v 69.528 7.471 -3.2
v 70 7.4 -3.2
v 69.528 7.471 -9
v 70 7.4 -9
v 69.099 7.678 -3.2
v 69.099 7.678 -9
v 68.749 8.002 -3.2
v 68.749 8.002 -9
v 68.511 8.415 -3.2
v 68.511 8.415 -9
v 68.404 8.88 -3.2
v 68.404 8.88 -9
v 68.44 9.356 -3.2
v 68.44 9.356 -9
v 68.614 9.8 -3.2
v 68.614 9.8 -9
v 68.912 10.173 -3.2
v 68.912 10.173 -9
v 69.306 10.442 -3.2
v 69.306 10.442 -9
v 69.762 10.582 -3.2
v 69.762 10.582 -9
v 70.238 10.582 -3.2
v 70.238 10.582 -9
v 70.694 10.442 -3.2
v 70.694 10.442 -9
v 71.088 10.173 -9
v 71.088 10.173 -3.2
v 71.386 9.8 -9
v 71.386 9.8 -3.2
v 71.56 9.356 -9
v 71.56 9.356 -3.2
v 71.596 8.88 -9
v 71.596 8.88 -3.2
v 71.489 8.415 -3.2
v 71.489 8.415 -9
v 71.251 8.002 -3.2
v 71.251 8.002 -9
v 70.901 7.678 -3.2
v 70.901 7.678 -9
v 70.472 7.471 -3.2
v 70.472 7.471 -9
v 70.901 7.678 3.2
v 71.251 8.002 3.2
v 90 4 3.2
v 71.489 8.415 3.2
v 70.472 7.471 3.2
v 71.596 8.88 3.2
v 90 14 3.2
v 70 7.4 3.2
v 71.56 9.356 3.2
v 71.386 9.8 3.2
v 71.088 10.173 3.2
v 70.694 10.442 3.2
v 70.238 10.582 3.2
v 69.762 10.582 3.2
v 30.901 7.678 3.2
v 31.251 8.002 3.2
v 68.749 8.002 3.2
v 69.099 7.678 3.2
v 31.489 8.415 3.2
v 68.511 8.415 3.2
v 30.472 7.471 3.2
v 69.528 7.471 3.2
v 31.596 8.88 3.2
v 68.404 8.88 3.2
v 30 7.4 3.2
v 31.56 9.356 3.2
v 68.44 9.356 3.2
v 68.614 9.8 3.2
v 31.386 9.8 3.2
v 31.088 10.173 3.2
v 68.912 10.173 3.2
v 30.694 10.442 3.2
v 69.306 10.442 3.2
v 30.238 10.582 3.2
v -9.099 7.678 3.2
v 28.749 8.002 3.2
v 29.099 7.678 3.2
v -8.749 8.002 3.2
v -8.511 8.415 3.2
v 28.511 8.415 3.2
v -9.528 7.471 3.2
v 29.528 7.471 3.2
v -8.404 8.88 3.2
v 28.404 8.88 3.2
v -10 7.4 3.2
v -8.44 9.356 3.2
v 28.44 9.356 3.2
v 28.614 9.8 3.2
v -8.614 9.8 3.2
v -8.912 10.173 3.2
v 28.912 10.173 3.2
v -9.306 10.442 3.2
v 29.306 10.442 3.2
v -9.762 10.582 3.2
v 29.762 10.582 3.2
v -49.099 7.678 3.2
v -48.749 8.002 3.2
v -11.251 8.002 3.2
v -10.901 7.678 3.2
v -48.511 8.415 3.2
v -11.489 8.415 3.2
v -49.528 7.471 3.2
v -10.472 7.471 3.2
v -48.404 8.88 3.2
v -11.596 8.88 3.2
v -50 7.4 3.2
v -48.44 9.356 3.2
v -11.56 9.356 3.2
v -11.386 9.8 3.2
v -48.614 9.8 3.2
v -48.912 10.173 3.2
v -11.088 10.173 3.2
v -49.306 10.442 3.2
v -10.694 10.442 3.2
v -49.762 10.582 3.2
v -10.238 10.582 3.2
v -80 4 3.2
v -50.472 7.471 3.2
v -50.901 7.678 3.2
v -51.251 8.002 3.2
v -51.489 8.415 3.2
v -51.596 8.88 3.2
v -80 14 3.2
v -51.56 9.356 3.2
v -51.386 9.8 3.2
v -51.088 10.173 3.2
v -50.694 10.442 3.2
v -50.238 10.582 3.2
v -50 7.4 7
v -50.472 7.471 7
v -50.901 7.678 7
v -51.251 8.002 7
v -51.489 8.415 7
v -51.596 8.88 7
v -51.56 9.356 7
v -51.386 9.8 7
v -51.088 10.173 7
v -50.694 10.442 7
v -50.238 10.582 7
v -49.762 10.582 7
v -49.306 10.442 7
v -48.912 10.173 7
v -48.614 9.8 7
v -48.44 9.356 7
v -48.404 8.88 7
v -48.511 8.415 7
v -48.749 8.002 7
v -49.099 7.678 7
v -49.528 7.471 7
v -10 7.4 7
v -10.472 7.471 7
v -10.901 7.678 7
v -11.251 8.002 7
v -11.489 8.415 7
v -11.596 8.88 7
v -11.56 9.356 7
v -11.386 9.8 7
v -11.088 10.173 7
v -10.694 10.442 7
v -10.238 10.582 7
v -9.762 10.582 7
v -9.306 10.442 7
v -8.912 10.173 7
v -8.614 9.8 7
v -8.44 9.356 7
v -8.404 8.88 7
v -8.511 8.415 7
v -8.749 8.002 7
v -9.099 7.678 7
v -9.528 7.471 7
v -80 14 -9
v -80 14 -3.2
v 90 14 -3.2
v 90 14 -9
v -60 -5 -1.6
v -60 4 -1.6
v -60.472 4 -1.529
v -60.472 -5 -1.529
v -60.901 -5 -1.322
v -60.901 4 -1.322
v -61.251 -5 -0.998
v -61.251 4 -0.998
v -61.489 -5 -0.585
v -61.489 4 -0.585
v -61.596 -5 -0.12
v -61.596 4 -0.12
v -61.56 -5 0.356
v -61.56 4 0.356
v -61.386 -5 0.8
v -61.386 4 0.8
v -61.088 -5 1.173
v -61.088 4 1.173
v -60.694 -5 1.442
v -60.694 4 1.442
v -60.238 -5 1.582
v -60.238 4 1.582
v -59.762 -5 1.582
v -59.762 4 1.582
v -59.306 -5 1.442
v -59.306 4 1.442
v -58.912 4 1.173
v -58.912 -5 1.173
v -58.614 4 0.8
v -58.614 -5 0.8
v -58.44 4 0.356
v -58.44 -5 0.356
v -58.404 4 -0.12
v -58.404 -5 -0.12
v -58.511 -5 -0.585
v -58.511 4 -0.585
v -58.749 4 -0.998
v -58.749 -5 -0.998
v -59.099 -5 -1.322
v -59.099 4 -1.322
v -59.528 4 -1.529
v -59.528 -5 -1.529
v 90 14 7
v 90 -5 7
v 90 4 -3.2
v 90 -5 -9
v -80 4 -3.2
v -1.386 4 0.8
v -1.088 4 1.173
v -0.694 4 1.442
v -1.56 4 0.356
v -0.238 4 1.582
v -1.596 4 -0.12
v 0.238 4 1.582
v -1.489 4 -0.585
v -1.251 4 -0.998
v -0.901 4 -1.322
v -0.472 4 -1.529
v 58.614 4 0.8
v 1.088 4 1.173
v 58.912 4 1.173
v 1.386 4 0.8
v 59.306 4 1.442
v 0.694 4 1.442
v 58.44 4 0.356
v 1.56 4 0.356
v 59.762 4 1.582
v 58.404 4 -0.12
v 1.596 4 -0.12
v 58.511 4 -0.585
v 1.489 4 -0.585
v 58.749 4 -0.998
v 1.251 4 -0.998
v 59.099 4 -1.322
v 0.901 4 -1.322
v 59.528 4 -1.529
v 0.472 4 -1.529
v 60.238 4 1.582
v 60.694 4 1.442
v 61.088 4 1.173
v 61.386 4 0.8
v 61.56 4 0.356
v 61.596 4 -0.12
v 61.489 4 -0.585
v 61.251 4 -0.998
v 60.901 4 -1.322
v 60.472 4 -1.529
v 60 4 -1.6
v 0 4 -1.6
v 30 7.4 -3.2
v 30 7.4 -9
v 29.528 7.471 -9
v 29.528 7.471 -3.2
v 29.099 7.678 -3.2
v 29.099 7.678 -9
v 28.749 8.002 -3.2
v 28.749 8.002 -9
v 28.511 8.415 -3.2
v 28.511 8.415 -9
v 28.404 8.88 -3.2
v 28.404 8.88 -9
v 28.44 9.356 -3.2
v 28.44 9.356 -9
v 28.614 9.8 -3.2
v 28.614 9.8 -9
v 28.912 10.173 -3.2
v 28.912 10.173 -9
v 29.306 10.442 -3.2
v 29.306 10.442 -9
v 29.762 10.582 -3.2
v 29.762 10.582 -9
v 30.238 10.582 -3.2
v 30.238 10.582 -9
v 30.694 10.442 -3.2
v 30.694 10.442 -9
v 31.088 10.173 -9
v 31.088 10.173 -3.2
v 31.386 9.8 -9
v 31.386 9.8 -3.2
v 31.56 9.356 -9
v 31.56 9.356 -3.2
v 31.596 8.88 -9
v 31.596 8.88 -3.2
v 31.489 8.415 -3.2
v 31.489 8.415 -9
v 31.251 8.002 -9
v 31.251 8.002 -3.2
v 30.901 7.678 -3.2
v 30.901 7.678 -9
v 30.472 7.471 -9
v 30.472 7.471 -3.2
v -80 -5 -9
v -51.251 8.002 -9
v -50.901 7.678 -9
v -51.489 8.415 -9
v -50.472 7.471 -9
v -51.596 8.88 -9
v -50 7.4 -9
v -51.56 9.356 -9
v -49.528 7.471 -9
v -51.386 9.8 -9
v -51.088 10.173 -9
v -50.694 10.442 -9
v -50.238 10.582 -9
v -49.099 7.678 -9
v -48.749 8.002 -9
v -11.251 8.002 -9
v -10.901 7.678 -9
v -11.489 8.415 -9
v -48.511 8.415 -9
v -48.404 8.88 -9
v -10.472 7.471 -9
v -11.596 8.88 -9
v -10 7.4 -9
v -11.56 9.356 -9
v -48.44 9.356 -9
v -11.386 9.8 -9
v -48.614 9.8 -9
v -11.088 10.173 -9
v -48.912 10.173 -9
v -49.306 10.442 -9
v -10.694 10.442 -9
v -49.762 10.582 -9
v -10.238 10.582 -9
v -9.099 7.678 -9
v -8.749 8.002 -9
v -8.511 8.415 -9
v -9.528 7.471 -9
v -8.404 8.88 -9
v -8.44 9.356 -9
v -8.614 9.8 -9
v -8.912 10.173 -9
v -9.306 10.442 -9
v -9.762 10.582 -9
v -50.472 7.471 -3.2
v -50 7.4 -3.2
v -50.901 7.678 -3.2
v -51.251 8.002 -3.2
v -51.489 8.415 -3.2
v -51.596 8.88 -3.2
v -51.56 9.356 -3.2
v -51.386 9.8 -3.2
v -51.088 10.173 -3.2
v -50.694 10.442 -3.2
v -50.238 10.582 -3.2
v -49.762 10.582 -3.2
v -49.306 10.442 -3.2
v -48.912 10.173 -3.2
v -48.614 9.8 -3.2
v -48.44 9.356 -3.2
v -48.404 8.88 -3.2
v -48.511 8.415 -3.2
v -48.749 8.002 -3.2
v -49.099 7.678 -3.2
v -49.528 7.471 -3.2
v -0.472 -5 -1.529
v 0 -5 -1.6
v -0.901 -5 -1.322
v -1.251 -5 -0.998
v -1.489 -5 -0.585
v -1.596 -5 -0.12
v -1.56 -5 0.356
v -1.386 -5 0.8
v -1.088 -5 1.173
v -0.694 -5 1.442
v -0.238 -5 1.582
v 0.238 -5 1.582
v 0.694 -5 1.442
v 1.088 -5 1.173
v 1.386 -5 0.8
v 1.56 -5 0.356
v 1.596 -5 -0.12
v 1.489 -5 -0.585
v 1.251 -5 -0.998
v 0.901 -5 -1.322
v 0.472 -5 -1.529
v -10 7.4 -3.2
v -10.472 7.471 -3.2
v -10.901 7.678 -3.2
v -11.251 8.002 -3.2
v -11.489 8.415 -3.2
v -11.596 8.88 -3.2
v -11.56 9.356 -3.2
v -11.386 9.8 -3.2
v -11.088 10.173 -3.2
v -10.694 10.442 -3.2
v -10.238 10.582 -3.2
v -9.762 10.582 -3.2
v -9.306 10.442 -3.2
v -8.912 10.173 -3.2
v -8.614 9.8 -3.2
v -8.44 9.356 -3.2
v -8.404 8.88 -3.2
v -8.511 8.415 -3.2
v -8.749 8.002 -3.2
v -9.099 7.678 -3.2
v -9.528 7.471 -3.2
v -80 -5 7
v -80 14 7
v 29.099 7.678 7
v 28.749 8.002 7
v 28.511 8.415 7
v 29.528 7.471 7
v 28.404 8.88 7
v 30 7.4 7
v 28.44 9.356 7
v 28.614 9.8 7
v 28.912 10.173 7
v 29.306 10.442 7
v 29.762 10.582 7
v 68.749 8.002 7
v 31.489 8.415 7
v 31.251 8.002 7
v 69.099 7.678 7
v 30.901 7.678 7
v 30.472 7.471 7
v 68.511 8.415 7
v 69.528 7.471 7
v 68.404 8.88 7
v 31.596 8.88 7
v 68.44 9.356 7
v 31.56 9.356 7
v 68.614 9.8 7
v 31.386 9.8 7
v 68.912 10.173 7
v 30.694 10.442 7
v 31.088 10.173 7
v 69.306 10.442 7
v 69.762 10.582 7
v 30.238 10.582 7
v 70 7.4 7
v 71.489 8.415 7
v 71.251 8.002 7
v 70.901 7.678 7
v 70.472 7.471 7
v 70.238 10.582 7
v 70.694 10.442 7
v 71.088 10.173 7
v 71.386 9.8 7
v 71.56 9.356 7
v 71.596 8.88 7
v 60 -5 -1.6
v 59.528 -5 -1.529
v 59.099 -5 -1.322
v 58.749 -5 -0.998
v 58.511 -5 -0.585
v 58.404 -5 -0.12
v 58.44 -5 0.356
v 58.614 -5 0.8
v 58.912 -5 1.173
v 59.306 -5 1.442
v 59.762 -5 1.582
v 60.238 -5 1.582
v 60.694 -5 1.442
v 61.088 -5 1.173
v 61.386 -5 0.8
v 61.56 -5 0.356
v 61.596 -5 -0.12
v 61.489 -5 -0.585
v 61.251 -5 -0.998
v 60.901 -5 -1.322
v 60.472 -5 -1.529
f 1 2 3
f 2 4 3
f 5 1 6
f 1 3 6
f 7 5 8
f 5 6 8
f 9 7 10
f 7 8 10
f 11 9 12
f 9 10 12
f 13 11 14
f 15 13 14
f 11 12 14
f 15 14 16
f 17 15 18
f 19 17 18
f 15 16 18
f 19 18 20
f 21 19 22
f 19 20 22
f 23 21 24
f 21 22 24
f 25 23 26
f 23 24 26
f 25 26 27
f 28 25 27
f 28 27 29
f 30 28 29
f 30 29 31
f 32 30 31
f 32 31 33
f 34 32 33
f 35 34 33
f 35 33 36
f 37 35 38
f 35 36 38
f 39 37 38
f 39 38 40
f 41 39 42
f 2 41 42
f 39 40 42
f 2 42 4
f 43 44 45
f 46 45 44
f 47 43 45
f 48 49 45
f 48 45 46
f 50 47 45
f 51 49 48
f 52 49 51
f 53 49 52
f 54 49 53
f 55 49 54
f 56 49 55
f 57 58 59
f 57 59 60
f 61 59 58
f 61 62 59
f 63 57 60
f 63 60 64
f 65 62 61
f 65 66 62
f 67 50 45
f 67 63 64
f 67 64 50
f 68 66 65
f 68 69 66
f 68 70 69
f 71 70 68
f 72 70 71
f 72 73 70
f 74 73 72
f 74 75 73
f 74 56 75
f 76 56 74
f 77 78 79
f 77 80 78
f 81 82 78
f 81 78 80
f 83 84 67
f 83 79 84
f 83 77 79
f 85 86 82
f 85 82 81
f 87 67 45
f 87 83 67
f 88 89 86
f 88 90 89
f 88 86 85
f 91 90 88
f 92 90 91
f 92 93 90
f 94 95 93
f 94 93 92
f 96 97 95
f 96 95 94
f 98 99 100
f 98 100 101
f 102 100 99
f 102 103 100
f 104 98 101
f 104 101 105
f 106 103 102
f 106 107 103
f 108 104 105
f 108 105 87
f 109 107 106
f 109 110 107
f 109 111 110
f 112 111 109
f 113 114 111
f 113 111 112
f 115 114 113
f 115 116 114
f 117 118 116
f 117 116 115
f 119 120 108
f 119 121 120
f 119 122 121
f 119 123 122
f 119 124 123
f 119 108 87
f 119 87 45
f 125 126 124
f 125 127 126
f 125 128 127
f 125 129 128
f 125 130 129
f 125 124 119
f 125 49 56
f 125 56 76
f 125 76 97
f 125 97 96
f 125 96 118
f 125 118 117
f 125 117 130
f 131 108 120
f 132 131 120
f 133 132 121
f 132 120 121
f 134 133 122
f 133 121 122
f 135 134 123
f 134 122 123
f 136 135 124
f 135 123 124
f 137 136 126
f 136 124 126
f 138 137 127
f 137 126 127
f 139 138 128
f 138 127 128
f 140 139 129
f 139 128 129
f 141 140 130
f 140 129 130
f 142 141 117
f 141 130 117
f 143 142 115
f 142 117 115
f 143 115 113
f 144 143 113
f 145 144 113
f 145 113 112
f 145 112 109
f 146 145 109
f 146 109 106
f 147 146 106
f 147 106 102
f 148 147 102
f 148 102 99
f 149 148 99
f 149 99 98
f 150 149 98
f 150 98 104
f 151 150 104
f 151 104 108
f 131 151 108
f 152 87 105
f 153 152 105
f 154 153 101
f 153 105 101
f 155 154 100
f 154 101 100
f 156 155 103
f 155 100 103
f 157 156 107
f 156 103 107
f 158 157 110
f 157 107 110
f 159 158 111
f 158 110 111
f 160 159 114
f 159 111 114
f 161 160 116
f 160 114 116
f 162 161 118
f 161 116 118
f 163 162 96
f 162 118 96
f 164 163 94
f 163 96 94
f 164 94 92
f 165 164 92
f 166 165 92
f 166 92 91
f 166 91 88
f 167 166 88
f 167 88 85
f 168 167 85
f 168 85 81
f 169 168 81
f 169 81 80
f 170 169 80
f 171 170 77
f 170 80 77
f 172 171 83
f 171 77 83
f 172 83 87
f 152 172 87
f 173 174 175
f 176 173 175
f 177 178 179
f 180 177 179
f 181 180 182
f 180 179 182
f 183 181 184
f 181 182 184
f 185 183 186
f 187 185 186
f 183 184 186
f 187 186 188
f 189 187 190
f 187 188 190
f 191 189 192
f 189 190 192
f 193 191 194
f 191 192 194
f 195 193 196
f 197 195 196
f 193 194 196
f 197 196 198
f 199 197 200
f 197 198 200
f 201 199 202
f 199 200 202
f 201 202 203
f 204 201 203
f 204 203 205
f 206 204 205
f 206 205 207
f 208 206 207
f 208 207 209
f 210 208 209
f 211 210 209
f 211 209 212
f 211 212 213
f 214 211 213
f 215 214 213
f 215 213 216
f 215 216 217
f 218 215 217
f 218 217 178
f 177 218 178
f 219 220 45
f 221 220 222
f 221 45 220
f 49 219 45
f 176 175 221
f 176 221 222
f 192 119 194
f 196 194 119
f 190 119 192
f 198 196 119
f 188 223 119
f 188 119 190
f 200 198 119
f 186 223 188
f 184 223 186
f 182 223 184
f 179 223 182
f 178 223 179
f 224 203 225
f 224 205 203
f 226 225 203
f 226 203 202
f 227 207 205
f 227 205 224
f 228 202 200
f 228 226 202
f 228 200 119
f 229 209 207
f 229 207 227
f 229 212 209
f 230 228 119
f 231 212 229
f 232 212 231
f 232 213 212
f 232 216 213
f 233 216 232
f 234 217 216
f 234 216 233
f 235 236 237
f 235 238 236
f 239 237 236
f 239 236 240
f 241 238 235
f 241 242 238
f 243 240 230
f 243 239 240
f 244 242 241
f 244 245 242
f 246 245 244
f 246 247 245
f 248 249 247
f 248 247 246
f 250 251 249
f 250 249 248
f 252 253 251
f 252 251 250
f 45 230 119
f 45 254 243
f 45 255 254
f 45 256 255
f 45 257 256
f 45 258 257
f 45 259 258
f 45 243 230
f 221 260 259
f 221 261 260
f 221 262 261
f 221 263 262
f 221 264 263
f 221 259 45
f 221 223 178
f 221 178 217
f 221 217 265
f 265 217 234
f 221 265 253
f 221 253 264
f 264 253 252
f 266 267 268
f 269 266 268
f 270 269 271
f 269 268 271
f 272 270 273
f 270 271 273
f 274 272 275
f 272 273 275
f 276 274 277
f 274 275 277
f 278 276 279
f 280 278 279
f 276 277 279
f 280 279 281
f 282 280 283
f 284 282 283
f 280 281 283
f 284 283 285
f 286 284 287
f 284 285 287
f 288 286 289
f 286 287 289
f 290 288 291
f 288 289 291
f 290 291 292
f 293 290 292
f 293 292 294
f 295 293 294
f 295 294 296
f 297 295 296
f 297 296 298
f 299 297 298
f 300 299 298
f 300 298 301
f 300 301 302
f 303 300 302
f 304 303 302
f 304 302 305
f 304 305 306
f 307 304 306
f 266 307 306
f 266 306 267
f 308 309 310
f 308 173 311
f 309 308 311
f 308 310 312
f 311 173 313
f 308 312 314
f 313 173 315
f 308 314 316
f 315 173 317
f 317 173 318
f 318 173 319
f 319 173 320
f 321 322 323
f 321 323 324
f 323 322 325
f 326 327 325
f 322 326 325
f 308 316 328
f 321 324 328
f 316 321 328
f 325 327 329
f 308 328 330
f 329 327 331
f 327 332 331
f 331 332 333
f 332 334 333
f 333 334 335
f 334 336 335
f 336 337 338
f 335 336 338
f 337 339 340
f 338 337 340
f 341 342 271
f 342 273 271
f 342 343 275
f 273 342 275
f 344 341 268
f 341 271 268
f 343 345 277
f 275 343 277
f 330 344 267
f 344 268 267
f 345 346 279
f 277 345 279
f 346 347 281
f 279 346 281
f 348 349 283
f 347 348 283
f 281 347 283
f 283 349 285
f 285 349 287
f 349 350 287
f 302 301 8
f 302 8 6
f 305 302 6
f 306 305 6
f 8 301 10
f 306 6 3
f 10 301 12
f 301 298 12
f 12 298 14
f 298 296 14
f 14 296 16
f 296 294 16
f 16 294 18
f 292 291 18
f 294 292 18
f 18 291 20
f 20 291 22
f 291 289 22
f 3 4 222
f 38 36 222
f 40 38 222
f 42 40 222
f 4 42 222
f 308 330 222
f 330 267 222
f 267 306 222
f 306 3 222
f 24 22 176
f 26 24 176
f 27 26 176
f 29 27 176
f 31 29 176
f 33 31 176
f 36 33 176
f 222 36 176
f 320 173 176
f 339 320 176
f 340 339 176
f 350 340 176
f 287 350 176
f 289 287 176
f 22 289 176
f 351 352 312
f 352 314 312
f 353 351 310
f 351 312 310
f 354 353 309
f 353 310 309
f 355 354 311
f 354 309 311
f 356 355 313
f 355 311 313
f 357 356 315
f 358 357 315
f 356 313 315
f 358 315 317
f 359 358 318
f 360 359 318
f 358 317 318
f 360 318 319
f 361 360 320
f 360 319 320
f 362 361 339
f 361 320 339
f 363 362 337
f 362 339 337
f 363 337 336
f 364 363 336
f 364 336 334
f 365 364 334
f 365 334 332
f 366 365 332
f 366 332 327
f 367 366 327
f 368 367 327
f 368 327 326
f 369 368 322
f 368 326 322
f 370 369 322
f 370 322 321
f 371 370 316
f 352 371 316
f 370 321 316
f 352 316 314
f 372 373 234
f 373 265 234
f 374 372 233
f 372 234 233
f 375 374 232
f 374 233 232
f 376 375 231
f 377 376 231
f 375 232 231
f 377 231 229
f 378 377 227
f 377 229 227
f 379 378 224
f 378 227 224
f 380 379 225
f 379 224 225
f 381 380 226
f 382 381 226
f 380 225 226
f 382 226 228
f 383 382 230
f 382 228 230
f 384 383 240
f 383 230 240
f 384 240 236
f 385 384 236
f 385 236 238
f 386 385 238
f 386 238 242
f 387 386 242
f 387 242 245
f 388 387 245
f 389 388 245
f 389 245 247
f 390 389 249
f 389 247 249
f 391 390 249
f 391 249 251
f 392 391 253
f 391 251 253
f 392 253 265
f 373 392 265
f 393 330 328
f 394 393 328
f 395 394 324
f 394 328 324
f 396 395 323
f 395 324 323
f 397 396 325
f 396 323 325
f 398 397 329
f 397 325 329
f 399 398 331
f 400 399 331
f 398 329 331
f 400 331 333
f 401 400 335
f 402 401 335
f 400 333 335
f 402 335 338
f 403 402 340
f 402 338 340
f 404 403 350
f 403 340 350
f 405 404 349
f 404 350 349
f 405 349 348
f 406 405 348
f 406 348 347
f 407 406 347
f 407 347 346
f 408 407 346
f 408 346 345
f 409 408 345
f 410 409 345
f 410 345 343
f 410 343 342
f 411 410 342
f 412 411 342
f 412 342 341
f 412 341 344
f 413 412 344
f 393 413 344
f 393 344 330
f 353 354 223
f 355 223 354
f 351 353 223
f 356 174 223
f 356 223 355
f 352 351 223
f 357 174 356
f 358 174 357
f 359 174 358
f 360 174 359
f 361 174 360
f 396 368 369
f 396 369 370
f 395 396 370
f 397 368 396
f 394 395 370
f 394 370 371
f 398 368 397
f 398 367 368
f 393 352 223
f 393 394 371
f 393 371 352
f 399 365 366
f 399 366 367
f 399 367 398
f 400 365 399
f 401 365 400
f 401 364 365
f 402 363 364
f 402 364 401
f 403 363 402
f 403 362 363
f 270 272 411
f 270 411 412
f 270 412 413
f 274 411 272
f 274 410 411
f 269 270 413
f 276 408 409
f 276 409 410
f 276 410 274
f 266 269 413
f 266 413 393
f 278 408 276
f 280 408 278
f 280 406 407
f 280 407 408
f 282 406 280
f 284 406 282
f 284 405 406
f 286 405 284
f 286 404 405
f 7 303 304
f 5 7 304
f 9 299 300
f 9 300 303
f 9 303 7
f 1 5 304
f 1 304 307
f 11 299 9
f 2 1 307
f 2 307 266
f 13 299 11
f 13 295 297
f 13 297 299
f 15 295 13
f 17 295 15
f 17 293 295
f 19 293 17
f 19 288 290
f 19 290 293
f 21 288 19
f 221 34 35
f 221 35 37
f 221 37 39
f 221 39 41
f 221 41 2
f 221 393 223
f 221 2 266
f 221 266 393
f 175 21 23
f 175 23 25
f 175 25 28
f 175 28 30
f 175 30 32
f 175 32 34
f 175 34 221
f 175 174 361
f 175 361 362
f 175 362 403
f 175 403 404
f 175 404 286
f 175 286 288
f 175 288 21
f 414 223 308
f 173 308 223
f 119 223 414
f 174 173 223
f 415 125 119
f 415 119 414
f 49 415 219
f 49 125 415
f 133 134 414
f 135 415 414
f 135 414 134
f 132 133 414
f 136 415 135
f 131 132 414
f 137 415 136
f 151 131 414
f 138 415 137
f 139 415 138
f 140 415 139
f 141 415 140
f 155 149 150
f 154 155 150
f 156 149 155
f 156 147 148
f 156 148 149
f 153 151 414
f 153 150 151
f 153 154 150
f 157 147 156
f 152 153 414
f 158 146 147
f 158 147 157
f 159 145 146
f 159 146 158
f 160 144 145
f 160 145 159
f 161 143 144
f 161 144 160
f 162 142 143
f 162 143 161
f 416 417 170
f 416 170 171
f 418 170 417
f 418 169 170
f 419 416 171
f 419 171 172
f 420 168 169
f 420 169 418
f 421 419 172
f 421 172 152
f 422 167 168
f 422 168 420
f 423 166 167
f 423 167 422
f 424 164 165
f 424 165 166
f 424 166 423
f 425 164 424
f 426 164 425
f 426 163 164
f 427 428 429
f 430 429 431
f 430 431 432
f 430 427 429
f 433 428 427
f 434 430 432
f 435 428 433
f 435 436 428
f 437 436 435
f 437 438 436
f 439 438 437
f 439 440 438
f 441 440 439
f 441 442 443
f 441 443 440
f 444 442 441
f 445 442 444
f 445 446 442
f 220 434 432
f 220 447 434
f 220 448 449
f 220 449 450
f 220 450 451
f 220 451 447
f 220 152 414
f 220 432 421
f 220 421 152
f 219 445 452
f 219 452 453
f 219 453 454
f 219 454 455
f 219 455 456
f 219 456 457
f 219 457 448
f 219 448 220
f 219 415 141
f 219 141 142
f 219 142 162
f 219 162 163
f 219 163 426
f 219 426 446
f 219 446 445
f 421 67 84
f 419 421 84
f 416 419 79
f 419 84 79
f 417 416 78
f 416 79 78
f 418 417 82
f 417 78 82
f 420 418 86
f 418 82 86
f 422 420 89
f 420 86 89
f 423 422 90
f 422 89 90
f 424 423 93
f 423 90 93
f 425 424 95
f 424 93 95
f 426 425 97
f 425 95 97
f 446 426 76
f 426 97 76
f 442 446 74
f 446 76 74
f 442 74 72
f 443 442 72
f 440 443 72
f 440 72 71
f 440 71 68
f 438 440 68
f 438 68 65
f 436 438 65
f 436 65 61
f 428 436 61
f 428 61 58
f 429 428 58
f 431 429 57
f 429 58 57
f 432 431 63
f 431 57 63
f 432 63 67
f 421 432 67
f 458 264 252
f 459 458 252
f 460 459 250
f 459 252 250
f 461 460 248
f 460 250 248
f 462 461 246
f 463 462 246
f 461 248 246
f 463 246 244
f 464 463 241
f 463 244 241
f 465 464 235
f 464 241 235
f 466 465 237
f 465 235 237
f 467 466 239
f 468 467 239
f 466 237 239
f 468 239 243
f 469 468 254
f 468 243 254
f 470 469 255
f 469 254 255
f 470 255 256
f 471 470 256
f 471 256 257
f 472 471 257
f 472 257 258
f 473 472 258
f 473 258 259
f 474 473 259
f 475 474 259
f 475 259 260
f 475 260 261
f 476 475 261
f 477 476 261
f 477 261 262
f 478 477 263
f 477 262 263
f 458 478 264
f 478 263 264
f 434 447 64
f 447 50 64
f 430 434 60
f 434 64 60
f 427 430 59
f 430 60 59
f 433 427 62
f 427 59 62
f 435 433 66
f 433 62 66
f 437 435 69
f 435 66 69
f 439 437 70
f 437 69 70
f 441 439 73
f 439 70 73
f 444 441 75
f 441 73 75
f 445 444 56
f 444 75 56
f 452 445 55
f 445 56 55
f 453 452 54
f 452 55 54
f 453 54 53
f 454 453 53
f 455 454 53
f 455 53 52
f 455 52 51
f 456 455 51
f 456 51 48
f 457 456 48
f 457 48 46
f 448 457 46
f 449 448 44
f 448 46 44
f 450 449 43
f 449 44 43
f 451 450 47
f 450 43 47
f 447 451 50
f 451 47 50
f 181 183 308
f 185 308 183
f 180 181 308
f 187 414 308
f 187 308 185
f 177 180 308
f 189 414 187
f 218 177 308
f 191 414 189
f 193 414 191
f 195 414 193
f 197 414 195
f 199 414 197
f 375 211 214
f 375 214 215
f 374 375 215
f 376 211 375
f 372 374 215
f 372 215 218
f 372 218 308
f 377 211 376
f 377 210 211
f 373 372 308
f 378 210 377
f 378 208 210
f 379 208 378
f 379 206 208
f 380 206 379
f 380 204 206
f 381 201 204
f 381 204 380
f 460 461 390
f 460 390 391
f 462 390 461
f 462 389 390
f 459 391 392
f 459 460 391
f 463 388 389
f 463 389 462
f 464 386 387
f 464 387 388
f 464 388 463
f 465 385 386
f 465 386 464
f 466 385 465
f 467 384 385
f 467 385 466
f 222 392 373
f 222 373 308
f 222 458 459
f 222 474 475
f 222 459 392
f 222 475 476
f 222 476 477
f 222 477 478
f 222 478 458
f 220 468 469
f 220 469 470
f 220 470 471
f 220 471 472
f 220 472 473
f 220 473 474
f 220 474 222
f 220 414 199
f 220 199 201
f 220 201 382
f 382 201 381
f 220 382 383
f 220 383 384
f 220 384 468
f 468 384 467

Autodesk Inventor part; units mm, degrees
ref_plane "YZ Plane" through (0, 0, 0) normal (1, 0, 0) x (0, 1, 0)
ref_plane "XZ Plane" through (0, 0, 0) normal (0, 1, 0) x (-1, 0, 0)
ref_plane "XY Plane" through (0, 0, 0) normal (0, 0, 1) x (1, 0, 0)
sketch "スケッチ1" plane through (0, 0, 0) normal (0, 1, 0) x (-1, 0, 0)
  line L0 (-90, -3) -> (90, -3)
  line L1 (90, -3) -> (90, 3)
  line L2 (90, 3) -> (-90, 3)
  line L3 (-90, 3) -> (-90, -3)
  line L4 (-90, -3) -> (90, 3) construction
  line L5 (90, -3) -> (-90, 3) construction
  point P0 (0, 0)
  dimension "d0" = 180
  dimension "d1" = 6
extrude "押し出し1" add sketch "スケッチ1" along normal blind 17
sketch "スケッチ2" plane through (0, 0, 0) normal (0, -1, 0) x (1, 0, 0)
  line L0 (-90, 3) -> (90, 3) projected
  line L1 (90, 3) -> (-80, 3)
  line L2 (-80, 3) -> (-80, 9)
  line L3 (-80, 9) -> (90, 9)
  line L4 (90, 9) -> (90, 3)
  line L5 (90, 3) -> (90, -3) projected
  line L6 (90, -3) -> (-80, -3)
  line L7 (-80, -3) -> (-80, -6)
  line L8 (-80, -6) -> (90, -6)
  line L9 (90, -6) -> (90, -3)
  point P0 (0, 0)
  dimension "d4" = 170
  dimension "d5" = 6
  dimension "d6" = 170
  dimension "d7" = 3
extrude "押し出し2" add sketch "スケッチ2" against normal blind 14
sketch "スケッチ3" plane through (0, 17, 0) normal (0, 1, 0) x (1, 0, 0)
  line L0 (-90, 3) -> (-90, -3) projected
  line L1 (90, -3) -> (90, 3) projected
  line L2 (-90, 3) -> (90, 3)
  line L3 (90, 3) -> (90, -3)
  line L4 (90, -3) -> (-90, -3)
  line L5 (-90, -3) -> (-90, 3)
  point P0 (0, 0)
extrude "押し出し3" cut sketch "スケッチ3" against normal blind 13
sketch "スケッチ4" plane through (0, 4, 0) normal (0, 1, 0) x (1, 0, 0)
  line L0 (-90, -3) -> (-90, 3) projected
  line L1 (-80, 6) -> (-80, 3) projected
  line L2 (-90, -3) -> (-80, -3)
  line L3 (-80, -3) -> (-80, 3)
  line L4 (-80, 3) -> (-90, 3)
  line L5 (-90, 3) -> (-90, -3)
  point P0 (0, 0)
extrude "押し出し4" cut sketch "スケッチ4" against normal blind 13
sketch "スケッチ5" plane through (0, 14, 0) normal (0, 1, 0) x (1, 0, 0)
  line L0 (97.0492, -3.2) -> (-97.0492, -3.2)
  line L1 (-97.0492, -3.2) -> (-97.0492, 3.2)
  line L2 (-97.0492, 3.2) -> (97.0492, 3.2)
  line L3 (97.0492, 3.2) -> (97.0492, -3.2)
  line L4 (97.0492, -3.2) -> (-97.0492, 3.2) construction
  line L5 (-97.0492, -3.2) -> (97.0492, 3.2) construction
  point P0 (0, 0)
  dimension "d14" = 6.4
extrude "押し出し5" cut sketch "スケッチ5" against normal blind 10
sketch "スケッチ6" plane through (-80, 0, 9) normal (0, 0, 1) x (1, 0, 0)
  line L0 (0, 14) -> (170, 14) projected
  line L1 (170, 0) -> (170, 14) projected
  point P0 (80, 0)
  point P1 (150, 9)
  point P2 (110, 9)
  point P3 (70, 9)
  point P4 (30, 9)
  dimension "d17" = 5
  dimension "d18" = 20
  dimension "d19" = 40
  dimension "d20" = 5
  dimension "d21" = 40
  dimension "d22" = 40
hole "穴1" at (70, 9, 9) at (30, 9, 9) at (-10, 9, 9) at (-50, 9, 9) direction (0, 0, -1) diameter 3.2 end through all
sketch "スケッチ7" plane through (0, 0, 0) normal (0, -1, 0) x (1, 0, 0)
  line L0 (-80, -6) -> (90, -6) projected
  line L1 (90, -6) -> (90, 9) projected
  line L2 (-80, -3.2) -> (90, -3.2) projected
  point P0 (0, 0)
  point P1 (60, 0)
  point P2 (0, 0)
  point P3 (-60, 0)
  dimension "d30" = 6
  dimension "d31" = 30
  dimension "d32" = 60
hole "穴2" at (60, 0, 0) at (0, 0, 0) at (-60, 0, 0) direction (0, 1, 0) diameter 3.2 end through all
sketch "スケッチ8" plane through (90, 0, -6) normal (0, 0, -1) x (-1, 0, 0)
  line L0 (170, 0) -> (170, 14) projected
  line L1 (0, 0) -> (170, 0)
  line L2 (170, 0) -> (170, 14)
  line L3 (170, 14) -> (0, 14)
  line L4 (0, 14) -> (0, 0)
  point P0 (90, 0)
extrude "押し出し6" add sketch "スケッチ8" along normal blind 3
sketch "スケッチ10" plane through (-80, 0, 9) normal (0, 0, 1) x (1, 0, 0)
  circle A0 centre (150, 9) radius 1.6 projected
  circle A1 centre (110, 9) radius 1.6 projected
  circle A2 centre (70, 9) radius 1.6 projected
  circle A3 centre (30, 9) radius 1.6 projected
  point P0 (80, 0)
hole "穴3" at (70, 9, 9) at (30, 9, 9) at (-10, 9, 9) at (-50, 9, 9) direction (0, 0, -1) diameter 3.2 end through all
sketch "スケッチ11" plane through (0, 14, 0) normal (0, 1, 0) x (1, 0, 0)
  line L0 (-80, -9) -> (90, -9) projected
  line L1 (-80, -9) -> (90, -9)
  line L2 (90, -9) -> (90, -6)
  line L3 (90, -6) -> (-80, -6)
  line L4 (-80, -6) -> (-80, -9)
  point P0 (0, 0)
  dimension "d49" = 170
  dimension "d50" = 3
extrude "押し出し7" cut sketch "スケッチ11" against normal blind 40
sketch "スケッチ12" plane through (-80, 14, 6) normal (0, 0, 1) x (1, 0, 0)
  line L0 (0, 0) -> (170, 0) projected
  line L1 (0, 0) -> (170, 0)
  line L2 (170, 0) -> (170, -14)
  line L3 (170, -14) -> (0, -14)
  line L4 (0, -14) -> (0, 0)
  point P0 (80, -14)
extrude "押し出し8" add sketch "スケッチ12" along normal blind 1
sketch "スケッチ13" plane through (0, 14, 0) normal (0, 1, 0) x (1, 0, 0)
  point P0 (0, 0)
sketch "スケッチ14" plane through (-80, 14, 7) normal (0, 0, 1) x (1, 0, 0)
  circle A0 centre (30, -5) radius 1.6 projected
  circle A1 centre (70, -5) radius 1.6 projected
  circle A2 centre (110, -5) radius 1.6 projected
  circle A3 centre (150, -5) radius 1.6 projected
  point P0 (80, -14)
hole "穴4" at (-50, 9, 7) at (-10, 9, 7) at (30, 9, 7) at (70, 9, 7) direction (0, 0, -1) diameter 3.2 depth 10
sketch "スケッチ15" plane through (0, 0, 0) normal (0, -1, 0) x (1, 0, 0)
  line L0 (-80, -9) -> (90, -9) projected
  line L1 (-80, 7) -> (90, 7)
  line L2 (90, 7) -> (90, -9)
  line L3 (90, -9) -> (-80, -9)
  line L4 (-80, -9) -> (-80, 7)
  point P0 (0, 0)
extrude "押し出し9" add sketch "スケッチ15" along normal blind 5
sketch "スケッチ16" plane through (0, -5, 0) normal (0, -1, 0) x (1, 0, 0)
  circle A0 centre (0, 0) radius 1.6 projected
  circle A1 centre (-60, 0) radius 1.6 projected
  circle A2 centre (60, 0) radius 1.6 projected
hole "穴5" at (60, -5, 0) at (0, -5, 0) at (-60, -5, 0) direction (0, 1, 0) diameter 3.2 depth 10
properties part number "lock2"
